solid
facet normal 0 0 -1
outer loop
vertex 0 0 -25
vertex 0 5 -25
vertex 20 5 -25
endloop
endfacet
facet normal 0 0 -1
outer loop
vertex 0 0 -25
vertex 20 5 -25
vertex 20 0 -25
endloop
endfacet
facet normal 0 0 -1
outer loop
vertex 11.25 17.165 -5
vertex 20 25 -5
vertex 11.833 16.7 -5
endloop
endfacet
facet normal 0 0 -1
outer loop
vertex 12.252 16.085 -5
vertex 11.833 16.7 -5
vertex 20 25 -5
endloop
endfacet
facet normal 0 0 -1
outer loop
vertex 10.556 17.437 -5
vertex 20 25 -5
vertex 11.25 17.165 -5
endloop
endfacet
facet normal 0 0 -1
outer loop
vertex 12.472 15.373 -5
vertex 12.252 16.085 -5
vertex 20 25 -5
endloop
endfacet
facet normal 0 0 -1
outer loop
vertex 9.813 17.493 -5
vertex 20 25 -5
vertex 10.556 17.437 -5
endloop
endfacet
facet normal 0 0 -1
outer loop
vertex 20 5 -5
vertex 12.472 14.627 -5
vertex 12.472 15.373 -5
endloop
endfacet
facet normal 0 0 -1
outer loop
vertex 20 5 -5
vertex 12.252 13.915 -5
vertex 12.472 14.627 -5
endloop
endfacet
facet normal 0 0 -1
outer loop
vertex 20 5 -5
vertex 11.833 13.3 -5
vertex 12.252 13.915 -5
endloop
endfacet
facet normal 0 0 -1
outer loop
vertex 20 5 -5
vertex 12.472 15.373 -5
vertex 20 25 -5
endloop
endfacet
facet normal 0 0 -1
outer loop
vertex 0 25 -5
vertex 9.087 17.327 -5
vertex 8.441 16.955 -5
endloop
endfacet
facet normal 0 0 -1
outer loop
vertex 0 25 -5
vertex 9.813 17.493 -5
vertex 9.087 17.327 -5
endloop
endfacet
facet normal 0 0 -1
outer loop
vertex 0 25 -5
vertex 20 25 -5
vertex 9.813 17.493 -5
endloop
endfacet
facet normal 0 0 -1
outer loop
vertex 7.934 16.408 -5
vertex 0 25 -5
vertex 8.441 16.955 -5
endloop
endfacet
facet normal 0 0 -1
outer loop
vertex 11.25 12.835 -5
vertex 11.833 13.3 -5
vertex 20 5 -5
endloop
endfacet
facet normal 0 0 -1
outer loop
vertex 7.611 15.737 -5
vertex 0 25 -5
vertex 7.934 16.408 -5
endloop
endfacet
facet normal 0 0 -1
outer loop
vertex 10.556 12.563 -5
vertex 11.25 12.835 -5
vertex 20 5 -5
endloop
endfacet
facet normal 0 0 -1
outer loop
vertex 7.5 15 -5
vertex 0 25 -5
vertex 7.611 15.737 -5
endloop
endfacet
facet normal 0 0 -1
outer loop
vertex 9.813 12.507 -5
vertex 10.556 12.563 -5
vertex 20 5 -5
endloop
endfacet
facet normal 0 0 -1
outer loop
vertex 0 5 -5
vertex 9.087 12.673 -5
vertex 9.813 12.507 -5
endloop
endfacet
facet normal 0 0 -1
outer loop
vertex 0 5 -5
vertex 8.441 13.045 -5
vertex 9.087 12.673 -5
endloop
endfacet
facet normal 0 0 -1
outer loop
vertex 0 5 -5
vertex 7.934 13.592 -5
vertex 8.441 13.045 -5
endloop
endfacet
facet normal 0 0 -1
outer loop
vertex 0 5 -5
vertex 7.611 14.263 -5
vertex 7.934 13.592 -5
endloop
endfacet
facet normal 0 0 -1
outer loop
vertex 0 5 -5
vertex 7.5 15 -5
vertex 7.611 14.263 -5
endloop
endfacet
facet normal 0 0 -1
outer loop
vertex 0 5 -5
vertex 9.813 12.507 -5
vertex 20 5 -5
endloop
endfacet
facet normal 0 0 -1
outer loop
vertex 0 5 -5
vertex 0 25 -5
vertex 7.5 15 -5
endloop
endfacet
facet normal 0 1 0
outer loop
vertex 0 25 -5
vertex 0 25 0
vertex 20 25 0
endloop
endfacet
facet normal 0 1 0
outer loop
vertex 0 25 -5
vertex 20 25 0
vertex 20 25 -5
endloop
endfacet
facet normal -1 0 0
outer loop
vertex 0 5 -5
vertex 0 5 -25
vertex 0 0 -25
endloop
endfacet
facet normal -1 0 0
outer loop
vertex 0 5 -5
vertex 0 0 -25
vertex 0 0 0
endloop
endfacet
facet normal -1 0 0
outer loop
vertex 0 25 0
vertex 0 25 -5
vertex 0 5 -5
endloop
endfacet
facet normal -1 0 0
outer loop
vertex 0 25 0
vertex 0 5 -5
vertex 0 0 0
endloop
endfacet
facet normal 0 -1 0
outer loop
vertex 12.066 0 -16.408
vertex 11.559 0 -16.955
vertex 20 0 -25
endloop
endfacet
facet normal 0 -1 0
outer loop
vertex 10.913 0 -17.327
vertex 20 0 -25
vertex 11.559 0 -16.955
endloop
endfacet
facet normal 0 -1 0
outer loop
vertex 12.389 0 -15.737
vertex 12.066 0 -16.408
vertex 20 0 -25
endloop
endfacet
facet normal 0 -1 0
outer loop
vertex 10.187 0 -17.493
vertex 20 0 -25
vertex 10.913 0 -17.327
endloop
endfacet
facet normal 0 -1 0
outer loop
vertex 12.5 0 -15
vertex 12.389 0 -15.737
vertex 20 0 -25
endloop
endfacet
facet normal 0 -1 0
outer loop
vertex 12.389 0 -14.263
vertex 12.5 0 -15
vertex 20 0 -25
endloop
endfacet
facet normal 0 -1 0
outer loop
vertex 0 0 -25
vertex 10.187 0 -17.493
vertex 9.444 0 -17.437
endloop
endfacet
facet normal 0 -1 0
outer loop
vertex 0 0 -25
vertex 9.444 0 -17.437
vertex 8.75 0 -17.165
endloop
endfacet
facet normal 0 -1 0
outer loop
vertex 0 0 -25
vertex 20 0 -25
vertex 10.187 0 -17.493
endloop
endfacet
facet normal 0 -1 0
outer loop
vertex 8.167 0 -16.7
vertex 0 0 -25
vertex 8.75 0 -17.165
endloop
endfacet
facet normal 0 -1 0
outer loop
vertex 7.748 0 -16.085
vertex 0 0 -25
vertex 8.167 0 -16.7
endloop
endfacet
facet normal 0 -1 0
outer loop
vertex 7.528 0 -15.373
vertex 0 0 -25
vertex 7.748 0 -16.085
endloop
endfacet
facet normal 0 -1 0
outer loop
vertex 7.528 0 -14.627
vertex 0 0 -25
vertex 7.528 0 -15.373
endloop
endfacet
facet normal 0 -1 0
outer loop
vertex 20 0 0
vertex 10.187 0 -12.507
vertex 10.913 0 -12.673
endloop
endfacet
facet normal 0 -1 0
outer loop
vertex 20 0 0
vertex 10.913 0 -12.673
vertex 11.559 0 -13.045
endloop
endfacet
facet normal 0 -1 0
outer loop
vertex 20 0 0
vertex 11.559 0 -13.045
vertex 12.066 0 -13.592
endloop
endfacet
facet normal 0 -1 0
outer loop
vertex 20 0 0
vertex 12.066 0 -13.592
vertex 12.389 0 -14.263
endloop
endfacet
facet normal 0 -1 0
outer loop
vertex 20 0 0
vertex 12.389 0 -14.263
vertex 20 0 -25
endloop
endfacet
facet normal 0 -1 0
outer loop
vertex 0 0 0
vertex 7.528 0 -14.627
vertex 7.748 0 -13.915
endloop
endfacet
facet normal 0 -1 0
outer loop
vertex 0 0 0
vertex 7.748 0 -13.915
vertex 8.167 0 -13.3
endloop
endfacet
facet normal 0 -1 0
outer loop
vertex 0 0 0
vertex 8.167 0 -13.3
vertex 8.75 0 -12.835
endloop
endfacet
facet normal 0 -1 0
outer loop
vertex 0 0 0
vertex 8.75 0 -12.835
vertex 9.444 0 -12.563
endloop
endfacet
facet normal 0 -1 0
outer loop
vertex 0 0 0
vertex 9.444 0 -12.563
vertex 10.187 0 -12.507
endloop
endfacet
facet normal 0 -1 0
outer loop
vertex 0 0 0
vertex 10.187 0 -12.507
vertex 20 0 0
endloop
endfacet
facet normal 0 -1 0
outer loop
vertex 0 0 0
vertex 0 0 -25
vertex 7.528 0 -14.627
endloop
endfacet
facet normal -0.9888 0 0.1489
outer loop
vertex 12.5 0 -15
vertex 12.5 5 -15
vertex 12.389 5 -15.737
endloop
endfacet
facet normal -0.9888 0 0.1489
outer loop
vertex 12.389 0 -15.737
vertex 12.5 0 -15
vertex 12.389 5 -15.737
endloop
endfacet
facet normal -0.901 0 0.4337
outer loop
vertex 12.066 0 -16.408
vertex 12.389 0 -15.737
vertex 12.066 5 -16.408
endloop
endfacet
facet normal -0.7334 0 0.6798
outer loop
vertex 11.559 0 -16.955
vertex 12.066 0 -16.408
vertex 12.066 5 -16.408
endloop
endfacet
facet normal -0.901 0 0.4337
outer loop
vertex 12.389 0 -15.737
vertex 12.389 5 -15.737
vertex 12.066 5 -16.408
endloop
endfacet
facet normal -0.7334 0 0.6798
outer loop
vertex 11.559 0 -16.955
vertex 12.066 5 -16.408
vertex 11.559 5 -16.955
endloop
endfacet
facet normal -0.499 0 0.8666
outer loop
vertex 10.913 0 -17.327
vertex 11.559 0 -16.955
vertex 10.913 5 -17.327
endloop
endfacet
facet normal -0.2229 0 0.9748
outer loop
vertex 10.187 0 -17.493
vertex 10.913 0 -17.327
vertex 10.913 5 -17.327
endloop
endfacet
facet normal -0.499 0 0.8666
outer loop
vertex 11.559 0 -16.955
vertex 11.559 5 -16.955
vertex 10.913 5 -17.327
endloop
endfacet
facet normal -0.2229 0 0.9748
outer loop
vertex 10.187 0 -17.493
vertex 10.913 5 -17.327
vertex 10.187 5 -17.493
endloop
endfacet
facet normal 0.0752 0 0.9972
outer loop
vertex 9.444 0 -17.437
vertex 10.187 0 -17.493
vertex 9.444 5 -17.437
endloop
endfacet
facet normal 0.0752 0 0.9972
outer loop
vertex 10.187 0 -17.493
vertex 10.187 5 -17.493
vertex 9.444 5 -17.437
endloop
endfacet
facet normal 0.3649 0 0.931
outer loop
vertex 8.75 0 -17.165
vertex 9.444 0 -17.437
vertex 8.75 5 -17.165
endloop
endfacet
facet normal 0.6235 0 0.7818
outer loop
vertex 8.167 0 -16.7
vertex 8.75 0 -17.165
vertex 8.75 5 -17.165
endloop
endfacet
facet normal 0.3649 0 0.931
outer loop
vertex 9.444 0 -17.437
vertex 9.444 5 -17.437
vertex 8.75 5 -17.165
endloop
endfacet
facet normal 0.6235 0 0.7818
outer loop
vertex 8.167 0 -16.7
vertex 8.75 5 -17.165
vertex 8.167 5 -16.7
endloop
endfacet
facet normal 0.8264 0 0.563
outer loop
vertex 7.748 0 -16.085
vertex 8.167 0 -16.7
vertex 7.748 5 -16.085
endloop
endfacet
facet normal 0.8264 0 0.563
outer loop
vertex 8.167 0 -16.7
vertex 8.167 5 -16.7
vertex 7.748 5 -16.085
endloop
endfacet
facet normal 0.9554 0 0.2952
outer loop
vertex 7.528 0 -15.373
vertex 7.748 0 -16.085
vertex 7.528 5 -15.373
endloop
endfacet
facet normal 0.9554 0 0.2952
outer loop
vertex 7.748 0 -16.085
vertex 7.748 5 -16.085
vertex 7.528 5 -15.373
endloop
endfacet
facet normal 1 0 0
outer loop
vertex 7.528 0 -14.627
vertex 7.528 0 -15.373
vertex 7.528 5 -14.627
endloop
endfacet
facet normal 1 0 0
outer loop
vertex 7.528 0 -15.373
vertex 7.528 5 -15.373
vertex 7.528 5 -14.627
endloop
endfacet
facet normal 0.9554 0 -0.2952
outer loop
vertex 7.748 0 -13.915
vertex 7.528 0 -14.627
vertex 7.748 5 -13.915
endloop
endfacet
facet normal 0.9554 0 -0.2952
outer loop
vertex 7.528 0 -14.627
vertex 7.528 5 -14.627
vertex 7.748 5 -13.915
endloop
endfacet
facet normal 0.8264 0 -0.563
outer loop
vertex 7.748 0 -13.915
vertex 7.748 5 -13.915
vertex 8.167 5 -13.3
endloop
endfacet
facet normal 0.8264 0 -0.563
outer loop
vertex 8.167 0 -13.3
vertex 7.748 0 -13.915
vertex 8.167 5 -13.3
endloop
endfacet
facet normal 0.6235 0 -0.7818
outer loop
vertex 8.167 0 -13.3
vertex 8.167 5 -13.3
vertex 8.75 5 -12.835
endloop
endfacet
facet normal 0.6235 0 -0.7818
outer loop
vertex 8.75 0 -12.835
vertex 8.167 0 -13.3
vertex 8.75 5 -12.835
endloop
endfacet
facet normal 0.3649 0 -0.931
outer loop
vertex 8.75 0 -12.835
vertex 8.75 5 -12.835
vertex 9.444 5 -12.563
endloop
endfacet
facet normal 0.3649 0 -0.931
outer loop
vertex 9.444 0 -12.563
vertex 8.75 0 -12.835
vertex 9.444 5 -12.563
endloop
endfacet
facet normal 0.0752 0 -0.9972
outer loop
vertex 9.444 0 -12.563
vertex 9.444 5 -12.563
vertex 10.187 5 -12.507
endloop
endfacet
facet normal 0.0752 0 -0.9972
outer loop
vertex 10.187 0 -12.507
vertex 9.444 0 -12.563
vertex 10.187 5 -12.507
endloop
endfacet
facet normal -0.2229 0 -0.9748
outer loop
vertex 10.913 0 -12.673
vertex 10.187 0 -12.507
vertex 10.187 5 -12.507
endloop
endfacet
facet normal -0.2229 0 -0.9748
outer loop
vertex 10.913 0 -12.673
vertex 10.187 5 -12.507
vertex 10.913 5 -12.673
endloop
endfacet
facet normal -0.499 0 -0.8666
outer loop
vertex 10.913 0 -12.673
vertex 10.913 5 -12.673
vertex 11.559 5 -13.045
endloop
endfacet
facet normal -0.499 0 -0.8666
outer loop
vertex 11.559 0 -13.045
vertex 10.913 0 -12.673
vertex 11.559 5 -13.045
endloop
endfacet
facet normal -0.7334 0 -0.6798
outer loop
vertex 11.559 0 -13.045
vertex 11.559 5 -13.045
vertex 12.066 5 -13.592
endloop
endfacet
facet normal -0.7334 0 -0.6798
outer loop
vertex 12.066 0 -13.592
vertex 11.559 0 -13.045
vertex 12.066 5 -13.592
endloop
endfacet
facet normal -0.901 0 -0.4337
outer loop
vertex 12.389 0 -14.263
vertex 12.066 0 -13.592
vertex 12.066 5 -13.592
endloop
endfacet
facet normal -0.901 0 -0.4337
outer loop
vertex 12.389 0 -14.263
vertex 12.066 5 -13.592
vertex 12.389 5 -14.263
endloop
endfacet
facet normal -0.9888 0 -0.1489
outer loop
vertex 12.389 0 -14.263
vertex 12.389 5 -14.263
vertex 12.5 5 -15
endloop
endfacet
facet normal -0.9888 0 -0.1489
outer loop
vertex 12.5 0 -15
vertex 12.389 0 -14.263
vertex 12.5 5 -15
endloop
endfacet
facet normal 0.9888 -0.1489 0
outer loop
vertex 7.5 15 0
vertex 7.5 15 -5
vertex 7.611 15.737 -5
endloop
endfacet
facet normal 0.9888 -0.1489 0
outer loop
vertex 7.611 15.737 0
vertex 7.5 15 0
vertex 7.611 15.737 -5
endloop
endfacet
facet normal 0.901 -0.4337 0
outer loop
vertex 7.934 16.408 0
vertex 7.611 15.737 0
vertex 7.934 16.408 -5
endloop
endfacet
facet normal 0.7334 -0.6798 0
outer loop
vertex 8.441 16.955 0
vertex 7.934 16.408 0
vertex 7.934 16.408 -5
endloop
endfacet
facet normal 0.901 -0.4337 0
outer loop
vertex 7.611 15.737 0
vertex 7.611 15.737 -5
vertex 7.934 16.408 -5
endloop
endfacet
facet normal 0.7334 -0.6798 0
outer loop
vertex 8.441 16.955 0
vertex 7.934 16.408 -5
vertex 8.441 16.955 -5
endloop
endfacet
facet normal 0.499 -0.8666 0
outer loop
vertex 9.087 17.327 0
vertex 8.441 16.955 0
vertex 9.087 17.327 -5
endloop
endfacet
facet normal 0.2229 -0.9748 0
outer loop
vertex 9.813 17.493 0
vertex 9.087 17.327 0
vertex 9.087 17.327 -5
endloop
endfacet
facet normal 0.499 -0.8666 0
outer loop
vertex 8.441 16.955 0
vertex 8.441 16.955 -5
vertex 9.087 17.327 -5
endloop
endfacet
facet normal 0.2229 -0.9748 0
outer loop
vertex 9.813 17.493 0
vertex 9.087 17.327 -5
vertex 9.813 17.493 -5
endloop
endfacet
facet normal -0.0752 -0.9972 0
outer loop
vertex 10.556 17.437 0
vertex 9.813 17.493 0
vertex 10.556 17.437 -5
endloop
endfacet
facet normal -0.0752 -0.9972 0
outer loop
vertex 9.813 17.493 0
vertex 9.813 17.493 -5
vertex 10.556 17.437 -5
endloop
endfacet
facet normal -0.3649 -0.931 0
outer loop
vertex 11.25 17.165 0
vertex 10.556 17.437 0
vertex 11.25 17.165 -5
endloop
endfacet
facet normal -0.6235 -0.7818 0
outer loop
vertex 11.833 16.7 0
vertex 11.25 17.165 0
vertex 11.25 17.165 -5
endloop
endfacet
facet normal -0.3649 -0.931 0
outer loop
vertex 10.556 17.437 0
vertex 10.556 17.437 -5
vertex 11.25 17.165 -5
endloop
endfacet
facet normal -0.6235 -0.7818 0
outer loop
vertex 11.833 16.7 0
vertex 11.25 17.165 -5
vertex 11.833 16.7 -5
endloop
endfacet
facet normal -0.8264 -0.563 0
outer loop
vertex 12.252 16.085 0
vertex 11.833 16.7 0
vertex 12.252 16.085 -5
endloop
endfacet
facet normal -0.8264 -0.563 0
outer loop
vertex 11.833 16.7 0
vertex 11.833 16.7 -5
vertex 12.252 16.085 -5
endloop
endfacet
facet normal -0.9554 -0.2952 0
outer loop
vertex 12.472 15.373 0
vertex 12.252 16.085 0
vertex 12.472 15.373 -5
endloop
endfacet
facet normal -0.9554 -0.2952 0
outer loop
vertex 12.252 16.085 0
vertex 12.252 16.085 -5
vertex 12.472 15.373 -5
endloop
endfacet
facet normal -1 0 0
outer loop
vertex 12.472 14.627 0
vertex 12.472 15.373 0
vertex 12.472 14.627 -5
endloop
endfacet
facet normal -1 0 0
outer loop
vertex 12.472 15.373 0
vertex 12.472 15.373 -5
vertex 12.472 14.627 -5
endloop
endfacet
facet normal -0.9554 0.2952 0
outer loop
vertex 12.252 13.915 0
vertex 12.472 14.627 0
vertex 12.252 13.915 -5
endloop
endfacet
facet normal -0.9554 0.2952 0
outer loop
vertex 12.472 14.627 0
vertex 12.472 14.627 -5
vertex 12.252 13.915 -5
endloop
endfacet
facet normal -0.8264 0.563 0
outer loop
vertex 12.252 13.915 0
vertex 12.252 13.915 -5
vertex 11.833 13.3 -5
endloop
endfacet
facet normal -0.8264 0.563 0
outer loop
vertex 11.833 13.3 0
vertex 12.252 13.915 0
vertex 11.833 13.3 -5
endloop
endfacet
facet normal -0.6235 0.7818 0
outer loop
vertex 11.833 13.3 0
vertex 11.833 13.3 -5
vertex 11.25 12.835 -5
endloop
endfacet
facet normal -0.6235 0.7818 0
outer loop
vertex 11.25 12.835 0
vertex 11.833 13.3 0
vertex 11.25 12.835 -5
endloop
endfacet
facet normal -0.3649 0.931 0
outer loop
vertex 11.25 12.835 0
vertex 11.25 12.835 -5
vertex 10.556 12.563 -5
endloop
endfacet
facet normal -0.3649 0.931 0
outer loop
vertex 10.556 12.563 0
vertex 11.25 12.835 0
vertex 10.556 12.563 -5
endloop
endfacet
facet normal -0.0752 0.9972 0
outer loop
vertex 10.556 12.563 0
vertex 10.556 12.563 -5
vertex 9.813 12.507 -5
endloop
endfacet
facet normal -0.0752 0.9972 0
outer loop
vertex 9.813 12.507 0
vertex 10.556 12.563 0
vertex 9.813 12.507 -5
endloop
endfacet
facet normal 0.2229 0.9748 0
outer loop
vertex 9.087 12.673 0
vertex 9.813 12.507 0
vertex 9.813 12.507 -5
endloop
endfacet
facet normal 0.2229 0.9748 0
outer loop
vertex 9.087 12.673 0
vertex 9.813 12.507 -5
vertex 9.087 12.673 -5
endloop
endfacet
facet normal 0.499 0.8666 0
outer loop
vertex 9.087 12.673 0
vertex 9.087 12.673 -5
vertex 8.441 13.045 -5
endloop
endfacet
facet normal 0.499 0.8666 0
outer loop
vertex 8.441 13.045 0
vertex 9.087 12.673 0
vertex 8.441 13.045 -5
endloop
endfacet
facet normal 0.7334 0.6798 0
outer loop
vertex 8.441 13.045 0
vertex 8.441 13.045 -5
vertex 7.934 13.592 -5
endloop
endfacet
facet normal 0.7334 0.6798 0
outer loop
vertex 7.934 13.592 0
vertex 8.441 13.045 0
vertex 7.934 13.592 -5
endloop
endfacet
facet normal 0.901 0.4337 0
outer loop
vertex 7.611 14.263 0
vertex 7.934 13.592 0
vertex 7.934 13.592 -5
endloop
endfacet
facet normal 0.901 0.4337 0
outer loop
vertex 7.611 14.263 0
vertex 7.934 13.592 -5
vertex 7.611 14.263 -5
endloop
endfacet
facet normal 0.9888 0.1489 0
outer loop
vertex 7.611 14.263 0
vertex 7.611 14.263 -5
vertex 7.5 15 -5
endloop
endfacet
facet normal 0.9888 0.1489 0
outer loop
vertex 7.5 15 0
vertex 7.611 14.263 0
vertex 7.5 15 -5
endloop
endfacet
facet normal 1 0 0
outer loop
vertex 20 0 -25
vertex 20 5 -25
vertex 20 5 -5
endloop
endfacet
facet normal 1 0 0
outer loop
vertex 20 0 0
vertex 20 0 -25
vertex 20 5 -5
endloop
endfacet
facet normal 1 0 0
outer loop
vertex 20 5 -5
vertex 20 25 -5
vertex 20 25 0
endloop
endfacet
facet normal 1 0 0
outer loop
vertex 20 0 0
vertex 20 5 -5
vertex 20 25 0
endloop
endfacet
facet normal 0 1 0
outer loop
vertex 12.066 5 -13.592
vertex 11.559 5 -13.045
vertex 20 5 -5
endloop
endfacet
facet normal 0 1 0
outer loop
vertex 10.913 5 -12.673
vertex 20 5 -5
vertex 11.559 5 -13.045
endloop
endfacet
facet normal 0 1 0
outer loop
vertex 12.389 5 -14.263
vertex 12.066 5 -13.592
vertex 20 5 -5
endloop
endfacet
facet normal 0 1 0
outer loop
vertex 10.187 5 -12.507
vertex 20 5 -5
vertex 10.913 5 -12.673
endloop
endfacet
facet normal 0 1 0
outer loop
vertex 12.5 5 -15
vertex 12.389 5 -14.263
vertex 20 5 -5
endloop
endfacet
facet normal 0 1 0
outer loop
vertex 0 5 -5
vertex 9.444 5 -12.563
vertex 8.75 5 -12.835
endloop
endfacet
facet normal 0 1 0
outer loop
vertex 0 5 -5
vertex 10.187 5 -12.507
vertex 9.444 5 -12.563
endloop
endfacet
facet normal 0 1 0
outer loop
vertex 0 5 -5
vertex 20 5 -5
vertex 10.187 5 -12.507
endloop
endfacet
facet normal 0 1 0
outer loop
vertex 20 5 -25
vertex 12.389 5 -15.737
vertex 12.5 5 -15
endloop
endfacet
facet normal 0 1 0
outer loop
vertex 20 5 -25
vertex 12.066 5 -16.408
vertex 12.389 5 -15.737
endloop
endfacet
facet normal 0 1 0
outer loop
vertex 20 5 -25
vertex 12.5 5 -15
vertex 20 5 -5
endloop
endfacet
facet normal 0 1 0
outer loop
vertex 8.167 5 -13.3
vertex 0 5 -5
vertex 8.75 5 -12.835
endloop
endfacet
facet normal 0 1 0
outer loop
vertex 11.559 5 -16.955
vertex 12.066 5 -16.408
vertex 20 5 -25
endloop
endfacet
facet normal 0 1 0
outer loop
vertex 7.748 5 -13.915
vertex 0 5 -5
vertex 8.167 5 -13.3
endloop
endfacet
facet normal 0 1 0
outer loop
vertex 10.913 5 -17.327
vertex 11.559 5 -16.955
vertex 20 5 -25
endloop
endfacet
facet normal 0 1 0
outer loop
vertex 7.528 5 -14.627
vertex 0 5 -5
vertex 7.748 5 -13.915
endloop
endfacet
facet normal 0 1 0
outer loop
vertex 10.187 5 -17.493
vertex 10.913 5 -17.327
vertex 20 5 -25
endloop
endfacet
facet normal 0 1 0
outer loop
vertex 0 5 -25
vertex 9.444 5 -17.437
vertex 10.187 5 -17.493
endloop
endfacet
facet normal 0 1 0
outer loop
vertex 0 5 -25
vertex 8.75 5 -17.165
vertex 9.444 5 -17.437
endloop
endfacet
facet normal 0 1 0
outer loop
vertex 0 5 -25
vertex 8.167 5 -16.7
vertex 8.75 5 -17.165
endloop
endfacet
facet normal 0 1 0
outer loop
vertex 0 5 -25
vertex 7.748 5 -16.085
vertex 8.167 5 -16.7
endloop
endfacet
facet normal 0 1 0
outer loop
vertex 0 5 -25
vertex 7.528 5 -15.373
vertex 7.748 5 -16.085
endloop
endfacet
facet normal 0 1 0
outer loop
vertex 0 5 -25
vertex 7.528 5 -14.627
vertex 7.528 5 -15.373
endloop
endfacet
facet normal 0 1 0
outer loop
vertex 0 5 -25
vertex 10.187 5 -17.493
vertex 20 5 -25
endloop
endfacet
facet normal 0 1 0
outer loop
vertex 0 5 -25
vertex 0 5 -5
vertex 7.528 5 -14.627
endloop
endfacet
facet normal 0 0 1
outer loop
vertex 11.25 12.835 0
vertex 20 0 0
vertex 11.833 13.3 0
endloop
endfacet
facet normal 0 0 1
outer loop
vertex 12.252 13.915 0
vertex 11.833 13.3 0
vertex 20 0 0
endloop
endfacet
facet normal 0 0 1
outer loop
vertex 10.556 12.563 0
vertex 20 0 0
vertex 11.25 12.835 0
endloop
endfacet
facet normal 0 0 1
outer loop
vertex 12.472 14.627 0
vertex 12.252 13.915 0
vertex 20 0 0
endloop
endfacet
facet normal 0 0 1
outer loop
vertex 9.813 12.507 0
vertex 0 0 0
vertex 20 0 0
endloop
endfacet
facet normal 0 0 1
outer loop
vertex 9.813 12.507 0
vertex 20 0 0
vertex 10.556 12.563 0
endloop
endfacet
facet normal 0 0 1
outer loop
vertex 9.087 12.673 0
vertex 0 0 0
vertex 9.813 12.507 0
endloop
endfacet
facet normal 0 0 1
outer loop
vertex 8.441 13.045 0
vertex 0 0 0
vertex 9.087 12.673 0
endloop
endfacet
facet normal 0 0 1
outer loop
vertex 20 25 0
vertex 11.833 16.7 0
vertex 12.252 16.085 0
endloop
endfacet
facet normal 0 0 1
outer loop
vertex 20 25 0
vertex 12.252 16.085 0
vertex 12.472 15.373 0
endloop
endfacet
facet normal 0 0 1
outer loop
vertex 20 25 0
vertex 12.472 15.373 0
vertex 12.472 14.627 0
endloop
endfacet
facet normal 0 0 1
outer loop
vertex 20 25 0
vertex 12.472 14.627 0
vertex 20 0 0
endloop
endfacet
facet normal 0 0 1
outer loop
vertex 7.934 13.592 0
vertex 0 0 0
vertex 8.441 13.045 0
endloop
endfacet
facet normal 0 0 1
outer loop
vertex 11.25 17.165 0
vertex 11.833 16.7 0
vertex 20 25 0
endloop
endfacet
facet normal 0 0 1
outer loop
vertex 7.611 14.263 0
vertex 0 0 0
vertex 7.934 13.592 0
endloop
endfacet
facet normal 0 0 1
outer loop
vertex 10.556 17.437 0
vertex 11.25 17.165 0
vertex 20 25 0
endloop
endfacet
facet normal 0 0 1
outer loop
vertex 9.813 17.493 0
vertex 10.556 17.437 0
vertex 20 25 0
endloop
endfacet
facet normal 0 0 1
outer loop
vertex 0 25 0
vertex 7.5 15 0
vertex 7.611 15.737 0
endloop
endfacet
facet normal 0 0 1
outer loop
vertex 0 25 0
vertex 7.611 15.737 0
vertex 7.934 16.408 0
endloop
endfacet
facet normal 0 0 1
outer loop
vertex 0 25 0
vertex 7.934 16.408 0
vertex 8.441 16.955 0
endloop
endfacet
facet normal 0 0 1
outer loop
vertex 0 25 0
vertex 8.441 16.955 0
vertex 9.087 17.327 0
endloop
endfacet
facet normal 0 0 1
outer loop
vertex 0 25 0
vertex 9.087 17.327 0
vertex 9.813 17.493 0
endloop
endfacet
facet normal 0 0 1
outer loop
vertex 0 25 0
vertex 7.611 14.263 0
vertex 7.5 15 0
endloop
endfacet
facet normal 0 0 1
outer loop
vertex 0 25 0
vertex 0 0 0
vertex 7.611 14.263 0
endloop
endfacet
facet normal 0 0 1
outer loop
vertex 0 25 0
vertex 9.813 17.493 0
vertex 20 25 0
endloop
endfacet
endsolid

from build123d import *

# Parameters (mm, degrees)
BOSS_EXTRUDE1_DEPTH = 20
SKETCH2_R           = 2.5
CUT_EXTRUDE1_DEPTH  = 6
SKETCH3_R           = 2.5
CUT_EXTRUDE2_DEPTH  = 6


with BuildPart() as part:
    # Sketch1 → Boss-Extrude1 (new body)
    with BuildSketch(Plane(origin=(0, 0, 0), x_dir=(0, 0, -1), z_dir=(1, 0, 0))):
        Polygon((0, 0), (0, 25), (5, 25), (5, 5), (25, 5), (25, 0), align=None)
    extrude(amount=BOSS_EXTRUDE1_DEPTH)

    # Sketch2 → Cut-Extrude1 (cut, through all)
    with BuildSketch(Plane(origin=(0, 5, 0), x_dir=(1, 0, 0), z_dir=(0, 1, 0))):
        with Locations((10, 15)):
            Circle(SKETCH2_R)
    extrude(amount=-CUT_EXTRUDE1_DEPTH, mode=Mode.SUBTRACT)

    # Sketch3 → Cut-Extrude2 (cut, through all)
    with BuildSketch(Plane(origin=(0, 0, -5), x_dir=(-1, 0, 0), z_dir=(0, 0, -1))):
        with Locations((-10, 15)):
            Circle(SKETCH3_R)
    extrude(amount=-CUT_EXTRUDE2_DEPTH, mode=Mode.SUBTRACT)


solid = part.part
